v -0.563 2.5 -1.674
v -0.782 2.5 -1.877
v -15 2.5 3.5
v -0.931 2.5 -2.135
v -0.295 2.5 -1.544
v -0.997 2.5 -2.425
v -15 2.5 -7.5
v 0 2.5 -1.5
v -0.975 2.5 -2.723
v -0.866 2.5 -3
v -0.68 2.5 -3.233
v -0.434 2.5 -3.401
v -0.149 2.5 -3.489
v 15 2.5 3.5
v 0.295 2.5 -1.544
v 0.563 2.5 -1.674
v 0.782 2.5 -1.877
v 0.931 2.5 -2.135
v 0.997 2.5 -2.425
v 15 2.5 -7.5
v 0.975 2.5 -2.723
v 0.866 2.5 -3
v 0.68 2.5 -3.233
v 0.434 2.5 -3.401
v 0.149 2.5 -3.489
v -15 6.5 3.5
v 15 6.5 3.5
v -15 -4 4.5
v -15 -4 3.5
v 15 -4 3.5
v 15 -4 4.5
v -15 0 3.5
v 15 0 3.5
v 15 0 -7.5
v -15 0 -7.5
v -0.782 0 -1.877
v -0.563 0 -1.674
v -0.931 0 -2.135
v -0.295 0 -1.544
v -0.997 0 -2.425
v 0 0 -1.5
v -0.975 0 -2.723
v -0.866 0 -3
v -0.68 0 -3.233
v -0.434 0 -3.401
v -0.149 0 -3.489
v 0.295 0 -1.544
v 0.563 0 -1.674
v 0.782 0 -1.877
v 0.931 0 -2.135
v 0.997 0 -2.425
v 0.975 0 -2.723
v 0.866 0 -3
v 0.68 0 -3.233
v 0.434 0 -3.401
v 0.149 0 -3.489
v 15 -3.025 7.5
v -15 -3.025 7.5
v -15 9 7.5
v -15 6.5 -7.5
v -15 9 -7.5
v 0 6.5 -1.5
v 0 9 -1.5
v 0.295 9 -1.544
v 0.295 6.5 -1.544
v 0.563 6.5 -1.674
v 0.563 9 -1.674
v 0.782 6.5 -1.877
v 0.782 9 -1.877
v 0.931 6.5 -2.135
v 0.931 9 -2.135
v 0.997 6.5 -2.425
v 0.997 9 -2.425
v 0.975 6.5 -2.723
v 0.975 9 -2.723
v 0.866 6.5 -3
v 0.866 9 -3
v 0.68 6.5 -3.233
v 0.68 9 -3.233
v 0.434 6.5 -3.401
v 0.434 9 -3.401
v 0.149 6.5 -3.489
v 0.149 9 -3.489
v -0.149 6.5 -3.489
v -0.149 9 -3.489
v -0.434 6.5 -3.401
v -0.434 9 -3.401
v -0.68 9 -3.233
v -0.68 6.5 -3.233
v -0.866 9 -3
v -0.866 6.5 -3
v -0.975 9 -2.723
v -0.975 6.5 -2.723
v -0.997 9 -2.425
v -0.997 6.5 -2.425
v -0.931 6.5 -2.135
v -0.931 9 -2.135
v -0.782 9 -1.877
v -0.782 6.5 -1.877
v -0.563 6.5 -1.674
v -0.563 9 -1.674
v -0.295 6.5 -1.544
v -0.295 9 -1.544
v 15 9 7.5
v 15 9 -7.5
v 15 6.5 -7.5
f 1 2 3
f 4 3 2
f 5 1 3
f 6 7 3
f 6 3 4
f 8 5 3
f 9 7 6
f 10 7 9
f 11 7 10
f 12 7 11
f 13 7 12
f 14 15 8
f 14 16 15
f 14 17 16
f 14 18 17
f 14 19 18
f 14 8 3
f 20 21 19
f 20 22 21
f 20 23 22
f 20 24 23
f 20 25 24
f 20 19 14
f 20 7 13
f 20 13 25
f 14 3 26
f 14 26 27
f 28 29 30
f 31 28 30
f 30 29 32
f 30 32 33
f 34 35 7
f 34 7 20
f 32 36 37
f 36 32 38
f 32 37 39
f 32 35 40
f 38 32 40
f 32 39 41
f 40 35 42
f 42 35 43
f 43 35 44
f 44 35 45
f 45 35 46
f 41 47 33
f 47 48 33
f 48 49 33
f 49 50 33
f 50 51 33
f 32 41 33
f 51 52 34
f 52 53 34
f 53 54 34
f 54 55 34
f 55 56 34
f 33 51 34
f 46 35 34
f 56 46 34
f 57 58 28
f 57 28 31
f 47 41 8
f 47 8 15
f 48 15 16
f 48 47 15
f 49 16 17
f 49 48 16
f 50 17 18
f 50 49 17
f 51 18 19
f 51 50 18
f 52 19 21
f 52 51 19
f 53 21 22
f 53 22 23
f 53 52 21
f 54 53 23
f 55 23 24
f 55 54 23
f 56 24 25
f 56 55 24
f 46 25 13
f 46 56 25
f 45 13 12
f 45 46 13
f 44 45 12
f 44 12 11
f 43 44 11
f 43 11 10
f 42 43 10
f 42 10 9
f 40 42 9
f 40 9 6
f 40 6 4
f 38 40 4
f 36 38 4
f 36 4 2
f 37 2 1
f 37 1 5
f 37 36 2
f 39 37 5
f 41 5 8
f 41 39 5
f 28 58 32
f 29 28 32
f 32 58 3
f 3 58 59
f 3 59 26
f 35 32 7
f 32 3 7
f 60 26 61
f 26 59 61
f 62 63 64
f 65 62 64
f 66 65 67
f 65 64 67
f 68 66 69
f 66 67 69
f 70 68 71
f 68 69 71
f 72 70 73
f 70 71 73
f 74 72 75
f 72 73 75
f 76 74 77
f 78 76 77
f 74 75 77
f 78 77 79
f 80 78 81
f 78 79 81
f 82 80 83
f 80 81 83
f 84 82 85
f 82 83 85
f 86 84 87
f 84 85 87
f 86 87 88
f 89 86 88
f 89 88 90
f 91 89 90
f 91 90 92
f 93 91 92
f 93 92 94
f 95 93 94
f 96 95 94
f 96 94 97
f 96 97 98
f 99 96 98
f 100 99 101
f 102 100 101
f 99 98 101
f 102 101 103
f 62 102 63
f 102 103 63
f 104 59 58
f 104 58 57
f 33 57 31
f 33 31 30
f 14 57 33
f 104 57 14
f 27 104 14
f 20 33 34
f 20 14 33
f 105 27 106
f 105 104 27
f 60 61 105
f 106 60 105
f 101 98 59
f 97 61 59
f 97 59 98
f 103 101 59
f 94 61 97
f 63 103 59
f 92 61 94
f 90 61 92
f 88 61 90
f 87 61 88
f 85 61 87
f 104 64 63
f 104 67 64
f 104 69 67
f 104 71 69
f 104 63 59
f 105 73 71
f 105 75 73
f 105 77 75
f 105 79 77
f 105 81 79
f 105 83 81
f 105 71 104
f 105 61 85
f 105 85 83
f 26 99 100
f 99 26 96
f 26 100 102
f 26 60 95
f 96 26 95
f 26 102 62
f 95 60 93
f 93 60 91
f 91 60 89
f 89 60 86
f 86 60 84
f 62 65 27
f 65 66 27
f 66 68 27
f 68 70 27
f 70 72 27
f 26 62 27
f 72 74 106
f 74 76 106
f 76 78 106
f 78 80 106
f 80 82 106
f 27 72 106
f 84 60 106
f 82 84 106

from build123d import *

# Parameters (mm, degrees)
SZKIC2_W                         = 30
SZKIC2_H                         = 15
SZKIC2_R                         = 1
DODANIE_WYCI_GNI_CIE1_DEPTH      = 2.5
DODANIE_WYCI_GNI_CIE2_DEPTH      = 4
DODANIE_WYCI_GNI_CIE2_DEPTH_BACK = 6.5
SZKIC4_W                         = 30
SZKIC4_H                         = 4
SFAZOWANIE1_SIZE                 = 3
SFAZOWANIE1_SIZE2                = 0.974759089


with BuildPart() as part:
    # Szkic2 → Dodanie-wyciągnięcie1 (new body)
    with BuildSketch(Plane(origin=(0, 0, 0), x_dir=(1, 0, 0), z_dir=(0, 1, 0))):
        Rectangle(SZKIC2_W, SZKIC2_H)
        with Locations(Location((0, 2.5, 0), (0, 0, 270))):
            Circle(SZKIC2_R, mode=Mode.SUBTRACT)
    dodanie_wyci_gni_cie1 = extrude(amount=DODANIE_WYCI_GNI_CIE1_DEPTH)

    # Szkic4 → Dodanie-wyciągnięcie2 (add, two sides: drawn at the far end of the back side and taken through both)
    with BuildSketch(Plane(origin=(0, 2.5, 0), x_dir=(1, 0, 0), z_dir=(0, 1, 0)).offset(-DODANIE_WYCI_GNI_CIE2_DEPTH_BACK)):
        with Locations((0, -5.5)):
            Rectangle(SZKIC4_W, SZKIC4_H)
    extrude(amount=DODANIE_WYCI_GNI_CIE2_DEPTH + DODANIE_WYCI_GNI_CIE2_DEPTH_BACK)

    # Lustro3: Dodanie-wyciągnięcie1 across plane
    add(dodanie_wyci_gni_cie1.mirror(Plane.ZX.offset(4.5)))

    # Sfazowanie1
    sfazowanie1_edges = [part.edges().sort_by_distance(p)[0] for p in [
        (0, -4, 7.5),
    ]]
    sfazowanie1_side = [part.faces().sort_by_distance(p)[0] for p in [
        (0, -4, 5.5),
    ]]
    chamfer(sfazowanie1_edges, length=SFAZOWANIE1_SIZE, length2=SFAZOWANIE1_SIZE2, reference=sfazowanie1_side[0])


solid = part.part
